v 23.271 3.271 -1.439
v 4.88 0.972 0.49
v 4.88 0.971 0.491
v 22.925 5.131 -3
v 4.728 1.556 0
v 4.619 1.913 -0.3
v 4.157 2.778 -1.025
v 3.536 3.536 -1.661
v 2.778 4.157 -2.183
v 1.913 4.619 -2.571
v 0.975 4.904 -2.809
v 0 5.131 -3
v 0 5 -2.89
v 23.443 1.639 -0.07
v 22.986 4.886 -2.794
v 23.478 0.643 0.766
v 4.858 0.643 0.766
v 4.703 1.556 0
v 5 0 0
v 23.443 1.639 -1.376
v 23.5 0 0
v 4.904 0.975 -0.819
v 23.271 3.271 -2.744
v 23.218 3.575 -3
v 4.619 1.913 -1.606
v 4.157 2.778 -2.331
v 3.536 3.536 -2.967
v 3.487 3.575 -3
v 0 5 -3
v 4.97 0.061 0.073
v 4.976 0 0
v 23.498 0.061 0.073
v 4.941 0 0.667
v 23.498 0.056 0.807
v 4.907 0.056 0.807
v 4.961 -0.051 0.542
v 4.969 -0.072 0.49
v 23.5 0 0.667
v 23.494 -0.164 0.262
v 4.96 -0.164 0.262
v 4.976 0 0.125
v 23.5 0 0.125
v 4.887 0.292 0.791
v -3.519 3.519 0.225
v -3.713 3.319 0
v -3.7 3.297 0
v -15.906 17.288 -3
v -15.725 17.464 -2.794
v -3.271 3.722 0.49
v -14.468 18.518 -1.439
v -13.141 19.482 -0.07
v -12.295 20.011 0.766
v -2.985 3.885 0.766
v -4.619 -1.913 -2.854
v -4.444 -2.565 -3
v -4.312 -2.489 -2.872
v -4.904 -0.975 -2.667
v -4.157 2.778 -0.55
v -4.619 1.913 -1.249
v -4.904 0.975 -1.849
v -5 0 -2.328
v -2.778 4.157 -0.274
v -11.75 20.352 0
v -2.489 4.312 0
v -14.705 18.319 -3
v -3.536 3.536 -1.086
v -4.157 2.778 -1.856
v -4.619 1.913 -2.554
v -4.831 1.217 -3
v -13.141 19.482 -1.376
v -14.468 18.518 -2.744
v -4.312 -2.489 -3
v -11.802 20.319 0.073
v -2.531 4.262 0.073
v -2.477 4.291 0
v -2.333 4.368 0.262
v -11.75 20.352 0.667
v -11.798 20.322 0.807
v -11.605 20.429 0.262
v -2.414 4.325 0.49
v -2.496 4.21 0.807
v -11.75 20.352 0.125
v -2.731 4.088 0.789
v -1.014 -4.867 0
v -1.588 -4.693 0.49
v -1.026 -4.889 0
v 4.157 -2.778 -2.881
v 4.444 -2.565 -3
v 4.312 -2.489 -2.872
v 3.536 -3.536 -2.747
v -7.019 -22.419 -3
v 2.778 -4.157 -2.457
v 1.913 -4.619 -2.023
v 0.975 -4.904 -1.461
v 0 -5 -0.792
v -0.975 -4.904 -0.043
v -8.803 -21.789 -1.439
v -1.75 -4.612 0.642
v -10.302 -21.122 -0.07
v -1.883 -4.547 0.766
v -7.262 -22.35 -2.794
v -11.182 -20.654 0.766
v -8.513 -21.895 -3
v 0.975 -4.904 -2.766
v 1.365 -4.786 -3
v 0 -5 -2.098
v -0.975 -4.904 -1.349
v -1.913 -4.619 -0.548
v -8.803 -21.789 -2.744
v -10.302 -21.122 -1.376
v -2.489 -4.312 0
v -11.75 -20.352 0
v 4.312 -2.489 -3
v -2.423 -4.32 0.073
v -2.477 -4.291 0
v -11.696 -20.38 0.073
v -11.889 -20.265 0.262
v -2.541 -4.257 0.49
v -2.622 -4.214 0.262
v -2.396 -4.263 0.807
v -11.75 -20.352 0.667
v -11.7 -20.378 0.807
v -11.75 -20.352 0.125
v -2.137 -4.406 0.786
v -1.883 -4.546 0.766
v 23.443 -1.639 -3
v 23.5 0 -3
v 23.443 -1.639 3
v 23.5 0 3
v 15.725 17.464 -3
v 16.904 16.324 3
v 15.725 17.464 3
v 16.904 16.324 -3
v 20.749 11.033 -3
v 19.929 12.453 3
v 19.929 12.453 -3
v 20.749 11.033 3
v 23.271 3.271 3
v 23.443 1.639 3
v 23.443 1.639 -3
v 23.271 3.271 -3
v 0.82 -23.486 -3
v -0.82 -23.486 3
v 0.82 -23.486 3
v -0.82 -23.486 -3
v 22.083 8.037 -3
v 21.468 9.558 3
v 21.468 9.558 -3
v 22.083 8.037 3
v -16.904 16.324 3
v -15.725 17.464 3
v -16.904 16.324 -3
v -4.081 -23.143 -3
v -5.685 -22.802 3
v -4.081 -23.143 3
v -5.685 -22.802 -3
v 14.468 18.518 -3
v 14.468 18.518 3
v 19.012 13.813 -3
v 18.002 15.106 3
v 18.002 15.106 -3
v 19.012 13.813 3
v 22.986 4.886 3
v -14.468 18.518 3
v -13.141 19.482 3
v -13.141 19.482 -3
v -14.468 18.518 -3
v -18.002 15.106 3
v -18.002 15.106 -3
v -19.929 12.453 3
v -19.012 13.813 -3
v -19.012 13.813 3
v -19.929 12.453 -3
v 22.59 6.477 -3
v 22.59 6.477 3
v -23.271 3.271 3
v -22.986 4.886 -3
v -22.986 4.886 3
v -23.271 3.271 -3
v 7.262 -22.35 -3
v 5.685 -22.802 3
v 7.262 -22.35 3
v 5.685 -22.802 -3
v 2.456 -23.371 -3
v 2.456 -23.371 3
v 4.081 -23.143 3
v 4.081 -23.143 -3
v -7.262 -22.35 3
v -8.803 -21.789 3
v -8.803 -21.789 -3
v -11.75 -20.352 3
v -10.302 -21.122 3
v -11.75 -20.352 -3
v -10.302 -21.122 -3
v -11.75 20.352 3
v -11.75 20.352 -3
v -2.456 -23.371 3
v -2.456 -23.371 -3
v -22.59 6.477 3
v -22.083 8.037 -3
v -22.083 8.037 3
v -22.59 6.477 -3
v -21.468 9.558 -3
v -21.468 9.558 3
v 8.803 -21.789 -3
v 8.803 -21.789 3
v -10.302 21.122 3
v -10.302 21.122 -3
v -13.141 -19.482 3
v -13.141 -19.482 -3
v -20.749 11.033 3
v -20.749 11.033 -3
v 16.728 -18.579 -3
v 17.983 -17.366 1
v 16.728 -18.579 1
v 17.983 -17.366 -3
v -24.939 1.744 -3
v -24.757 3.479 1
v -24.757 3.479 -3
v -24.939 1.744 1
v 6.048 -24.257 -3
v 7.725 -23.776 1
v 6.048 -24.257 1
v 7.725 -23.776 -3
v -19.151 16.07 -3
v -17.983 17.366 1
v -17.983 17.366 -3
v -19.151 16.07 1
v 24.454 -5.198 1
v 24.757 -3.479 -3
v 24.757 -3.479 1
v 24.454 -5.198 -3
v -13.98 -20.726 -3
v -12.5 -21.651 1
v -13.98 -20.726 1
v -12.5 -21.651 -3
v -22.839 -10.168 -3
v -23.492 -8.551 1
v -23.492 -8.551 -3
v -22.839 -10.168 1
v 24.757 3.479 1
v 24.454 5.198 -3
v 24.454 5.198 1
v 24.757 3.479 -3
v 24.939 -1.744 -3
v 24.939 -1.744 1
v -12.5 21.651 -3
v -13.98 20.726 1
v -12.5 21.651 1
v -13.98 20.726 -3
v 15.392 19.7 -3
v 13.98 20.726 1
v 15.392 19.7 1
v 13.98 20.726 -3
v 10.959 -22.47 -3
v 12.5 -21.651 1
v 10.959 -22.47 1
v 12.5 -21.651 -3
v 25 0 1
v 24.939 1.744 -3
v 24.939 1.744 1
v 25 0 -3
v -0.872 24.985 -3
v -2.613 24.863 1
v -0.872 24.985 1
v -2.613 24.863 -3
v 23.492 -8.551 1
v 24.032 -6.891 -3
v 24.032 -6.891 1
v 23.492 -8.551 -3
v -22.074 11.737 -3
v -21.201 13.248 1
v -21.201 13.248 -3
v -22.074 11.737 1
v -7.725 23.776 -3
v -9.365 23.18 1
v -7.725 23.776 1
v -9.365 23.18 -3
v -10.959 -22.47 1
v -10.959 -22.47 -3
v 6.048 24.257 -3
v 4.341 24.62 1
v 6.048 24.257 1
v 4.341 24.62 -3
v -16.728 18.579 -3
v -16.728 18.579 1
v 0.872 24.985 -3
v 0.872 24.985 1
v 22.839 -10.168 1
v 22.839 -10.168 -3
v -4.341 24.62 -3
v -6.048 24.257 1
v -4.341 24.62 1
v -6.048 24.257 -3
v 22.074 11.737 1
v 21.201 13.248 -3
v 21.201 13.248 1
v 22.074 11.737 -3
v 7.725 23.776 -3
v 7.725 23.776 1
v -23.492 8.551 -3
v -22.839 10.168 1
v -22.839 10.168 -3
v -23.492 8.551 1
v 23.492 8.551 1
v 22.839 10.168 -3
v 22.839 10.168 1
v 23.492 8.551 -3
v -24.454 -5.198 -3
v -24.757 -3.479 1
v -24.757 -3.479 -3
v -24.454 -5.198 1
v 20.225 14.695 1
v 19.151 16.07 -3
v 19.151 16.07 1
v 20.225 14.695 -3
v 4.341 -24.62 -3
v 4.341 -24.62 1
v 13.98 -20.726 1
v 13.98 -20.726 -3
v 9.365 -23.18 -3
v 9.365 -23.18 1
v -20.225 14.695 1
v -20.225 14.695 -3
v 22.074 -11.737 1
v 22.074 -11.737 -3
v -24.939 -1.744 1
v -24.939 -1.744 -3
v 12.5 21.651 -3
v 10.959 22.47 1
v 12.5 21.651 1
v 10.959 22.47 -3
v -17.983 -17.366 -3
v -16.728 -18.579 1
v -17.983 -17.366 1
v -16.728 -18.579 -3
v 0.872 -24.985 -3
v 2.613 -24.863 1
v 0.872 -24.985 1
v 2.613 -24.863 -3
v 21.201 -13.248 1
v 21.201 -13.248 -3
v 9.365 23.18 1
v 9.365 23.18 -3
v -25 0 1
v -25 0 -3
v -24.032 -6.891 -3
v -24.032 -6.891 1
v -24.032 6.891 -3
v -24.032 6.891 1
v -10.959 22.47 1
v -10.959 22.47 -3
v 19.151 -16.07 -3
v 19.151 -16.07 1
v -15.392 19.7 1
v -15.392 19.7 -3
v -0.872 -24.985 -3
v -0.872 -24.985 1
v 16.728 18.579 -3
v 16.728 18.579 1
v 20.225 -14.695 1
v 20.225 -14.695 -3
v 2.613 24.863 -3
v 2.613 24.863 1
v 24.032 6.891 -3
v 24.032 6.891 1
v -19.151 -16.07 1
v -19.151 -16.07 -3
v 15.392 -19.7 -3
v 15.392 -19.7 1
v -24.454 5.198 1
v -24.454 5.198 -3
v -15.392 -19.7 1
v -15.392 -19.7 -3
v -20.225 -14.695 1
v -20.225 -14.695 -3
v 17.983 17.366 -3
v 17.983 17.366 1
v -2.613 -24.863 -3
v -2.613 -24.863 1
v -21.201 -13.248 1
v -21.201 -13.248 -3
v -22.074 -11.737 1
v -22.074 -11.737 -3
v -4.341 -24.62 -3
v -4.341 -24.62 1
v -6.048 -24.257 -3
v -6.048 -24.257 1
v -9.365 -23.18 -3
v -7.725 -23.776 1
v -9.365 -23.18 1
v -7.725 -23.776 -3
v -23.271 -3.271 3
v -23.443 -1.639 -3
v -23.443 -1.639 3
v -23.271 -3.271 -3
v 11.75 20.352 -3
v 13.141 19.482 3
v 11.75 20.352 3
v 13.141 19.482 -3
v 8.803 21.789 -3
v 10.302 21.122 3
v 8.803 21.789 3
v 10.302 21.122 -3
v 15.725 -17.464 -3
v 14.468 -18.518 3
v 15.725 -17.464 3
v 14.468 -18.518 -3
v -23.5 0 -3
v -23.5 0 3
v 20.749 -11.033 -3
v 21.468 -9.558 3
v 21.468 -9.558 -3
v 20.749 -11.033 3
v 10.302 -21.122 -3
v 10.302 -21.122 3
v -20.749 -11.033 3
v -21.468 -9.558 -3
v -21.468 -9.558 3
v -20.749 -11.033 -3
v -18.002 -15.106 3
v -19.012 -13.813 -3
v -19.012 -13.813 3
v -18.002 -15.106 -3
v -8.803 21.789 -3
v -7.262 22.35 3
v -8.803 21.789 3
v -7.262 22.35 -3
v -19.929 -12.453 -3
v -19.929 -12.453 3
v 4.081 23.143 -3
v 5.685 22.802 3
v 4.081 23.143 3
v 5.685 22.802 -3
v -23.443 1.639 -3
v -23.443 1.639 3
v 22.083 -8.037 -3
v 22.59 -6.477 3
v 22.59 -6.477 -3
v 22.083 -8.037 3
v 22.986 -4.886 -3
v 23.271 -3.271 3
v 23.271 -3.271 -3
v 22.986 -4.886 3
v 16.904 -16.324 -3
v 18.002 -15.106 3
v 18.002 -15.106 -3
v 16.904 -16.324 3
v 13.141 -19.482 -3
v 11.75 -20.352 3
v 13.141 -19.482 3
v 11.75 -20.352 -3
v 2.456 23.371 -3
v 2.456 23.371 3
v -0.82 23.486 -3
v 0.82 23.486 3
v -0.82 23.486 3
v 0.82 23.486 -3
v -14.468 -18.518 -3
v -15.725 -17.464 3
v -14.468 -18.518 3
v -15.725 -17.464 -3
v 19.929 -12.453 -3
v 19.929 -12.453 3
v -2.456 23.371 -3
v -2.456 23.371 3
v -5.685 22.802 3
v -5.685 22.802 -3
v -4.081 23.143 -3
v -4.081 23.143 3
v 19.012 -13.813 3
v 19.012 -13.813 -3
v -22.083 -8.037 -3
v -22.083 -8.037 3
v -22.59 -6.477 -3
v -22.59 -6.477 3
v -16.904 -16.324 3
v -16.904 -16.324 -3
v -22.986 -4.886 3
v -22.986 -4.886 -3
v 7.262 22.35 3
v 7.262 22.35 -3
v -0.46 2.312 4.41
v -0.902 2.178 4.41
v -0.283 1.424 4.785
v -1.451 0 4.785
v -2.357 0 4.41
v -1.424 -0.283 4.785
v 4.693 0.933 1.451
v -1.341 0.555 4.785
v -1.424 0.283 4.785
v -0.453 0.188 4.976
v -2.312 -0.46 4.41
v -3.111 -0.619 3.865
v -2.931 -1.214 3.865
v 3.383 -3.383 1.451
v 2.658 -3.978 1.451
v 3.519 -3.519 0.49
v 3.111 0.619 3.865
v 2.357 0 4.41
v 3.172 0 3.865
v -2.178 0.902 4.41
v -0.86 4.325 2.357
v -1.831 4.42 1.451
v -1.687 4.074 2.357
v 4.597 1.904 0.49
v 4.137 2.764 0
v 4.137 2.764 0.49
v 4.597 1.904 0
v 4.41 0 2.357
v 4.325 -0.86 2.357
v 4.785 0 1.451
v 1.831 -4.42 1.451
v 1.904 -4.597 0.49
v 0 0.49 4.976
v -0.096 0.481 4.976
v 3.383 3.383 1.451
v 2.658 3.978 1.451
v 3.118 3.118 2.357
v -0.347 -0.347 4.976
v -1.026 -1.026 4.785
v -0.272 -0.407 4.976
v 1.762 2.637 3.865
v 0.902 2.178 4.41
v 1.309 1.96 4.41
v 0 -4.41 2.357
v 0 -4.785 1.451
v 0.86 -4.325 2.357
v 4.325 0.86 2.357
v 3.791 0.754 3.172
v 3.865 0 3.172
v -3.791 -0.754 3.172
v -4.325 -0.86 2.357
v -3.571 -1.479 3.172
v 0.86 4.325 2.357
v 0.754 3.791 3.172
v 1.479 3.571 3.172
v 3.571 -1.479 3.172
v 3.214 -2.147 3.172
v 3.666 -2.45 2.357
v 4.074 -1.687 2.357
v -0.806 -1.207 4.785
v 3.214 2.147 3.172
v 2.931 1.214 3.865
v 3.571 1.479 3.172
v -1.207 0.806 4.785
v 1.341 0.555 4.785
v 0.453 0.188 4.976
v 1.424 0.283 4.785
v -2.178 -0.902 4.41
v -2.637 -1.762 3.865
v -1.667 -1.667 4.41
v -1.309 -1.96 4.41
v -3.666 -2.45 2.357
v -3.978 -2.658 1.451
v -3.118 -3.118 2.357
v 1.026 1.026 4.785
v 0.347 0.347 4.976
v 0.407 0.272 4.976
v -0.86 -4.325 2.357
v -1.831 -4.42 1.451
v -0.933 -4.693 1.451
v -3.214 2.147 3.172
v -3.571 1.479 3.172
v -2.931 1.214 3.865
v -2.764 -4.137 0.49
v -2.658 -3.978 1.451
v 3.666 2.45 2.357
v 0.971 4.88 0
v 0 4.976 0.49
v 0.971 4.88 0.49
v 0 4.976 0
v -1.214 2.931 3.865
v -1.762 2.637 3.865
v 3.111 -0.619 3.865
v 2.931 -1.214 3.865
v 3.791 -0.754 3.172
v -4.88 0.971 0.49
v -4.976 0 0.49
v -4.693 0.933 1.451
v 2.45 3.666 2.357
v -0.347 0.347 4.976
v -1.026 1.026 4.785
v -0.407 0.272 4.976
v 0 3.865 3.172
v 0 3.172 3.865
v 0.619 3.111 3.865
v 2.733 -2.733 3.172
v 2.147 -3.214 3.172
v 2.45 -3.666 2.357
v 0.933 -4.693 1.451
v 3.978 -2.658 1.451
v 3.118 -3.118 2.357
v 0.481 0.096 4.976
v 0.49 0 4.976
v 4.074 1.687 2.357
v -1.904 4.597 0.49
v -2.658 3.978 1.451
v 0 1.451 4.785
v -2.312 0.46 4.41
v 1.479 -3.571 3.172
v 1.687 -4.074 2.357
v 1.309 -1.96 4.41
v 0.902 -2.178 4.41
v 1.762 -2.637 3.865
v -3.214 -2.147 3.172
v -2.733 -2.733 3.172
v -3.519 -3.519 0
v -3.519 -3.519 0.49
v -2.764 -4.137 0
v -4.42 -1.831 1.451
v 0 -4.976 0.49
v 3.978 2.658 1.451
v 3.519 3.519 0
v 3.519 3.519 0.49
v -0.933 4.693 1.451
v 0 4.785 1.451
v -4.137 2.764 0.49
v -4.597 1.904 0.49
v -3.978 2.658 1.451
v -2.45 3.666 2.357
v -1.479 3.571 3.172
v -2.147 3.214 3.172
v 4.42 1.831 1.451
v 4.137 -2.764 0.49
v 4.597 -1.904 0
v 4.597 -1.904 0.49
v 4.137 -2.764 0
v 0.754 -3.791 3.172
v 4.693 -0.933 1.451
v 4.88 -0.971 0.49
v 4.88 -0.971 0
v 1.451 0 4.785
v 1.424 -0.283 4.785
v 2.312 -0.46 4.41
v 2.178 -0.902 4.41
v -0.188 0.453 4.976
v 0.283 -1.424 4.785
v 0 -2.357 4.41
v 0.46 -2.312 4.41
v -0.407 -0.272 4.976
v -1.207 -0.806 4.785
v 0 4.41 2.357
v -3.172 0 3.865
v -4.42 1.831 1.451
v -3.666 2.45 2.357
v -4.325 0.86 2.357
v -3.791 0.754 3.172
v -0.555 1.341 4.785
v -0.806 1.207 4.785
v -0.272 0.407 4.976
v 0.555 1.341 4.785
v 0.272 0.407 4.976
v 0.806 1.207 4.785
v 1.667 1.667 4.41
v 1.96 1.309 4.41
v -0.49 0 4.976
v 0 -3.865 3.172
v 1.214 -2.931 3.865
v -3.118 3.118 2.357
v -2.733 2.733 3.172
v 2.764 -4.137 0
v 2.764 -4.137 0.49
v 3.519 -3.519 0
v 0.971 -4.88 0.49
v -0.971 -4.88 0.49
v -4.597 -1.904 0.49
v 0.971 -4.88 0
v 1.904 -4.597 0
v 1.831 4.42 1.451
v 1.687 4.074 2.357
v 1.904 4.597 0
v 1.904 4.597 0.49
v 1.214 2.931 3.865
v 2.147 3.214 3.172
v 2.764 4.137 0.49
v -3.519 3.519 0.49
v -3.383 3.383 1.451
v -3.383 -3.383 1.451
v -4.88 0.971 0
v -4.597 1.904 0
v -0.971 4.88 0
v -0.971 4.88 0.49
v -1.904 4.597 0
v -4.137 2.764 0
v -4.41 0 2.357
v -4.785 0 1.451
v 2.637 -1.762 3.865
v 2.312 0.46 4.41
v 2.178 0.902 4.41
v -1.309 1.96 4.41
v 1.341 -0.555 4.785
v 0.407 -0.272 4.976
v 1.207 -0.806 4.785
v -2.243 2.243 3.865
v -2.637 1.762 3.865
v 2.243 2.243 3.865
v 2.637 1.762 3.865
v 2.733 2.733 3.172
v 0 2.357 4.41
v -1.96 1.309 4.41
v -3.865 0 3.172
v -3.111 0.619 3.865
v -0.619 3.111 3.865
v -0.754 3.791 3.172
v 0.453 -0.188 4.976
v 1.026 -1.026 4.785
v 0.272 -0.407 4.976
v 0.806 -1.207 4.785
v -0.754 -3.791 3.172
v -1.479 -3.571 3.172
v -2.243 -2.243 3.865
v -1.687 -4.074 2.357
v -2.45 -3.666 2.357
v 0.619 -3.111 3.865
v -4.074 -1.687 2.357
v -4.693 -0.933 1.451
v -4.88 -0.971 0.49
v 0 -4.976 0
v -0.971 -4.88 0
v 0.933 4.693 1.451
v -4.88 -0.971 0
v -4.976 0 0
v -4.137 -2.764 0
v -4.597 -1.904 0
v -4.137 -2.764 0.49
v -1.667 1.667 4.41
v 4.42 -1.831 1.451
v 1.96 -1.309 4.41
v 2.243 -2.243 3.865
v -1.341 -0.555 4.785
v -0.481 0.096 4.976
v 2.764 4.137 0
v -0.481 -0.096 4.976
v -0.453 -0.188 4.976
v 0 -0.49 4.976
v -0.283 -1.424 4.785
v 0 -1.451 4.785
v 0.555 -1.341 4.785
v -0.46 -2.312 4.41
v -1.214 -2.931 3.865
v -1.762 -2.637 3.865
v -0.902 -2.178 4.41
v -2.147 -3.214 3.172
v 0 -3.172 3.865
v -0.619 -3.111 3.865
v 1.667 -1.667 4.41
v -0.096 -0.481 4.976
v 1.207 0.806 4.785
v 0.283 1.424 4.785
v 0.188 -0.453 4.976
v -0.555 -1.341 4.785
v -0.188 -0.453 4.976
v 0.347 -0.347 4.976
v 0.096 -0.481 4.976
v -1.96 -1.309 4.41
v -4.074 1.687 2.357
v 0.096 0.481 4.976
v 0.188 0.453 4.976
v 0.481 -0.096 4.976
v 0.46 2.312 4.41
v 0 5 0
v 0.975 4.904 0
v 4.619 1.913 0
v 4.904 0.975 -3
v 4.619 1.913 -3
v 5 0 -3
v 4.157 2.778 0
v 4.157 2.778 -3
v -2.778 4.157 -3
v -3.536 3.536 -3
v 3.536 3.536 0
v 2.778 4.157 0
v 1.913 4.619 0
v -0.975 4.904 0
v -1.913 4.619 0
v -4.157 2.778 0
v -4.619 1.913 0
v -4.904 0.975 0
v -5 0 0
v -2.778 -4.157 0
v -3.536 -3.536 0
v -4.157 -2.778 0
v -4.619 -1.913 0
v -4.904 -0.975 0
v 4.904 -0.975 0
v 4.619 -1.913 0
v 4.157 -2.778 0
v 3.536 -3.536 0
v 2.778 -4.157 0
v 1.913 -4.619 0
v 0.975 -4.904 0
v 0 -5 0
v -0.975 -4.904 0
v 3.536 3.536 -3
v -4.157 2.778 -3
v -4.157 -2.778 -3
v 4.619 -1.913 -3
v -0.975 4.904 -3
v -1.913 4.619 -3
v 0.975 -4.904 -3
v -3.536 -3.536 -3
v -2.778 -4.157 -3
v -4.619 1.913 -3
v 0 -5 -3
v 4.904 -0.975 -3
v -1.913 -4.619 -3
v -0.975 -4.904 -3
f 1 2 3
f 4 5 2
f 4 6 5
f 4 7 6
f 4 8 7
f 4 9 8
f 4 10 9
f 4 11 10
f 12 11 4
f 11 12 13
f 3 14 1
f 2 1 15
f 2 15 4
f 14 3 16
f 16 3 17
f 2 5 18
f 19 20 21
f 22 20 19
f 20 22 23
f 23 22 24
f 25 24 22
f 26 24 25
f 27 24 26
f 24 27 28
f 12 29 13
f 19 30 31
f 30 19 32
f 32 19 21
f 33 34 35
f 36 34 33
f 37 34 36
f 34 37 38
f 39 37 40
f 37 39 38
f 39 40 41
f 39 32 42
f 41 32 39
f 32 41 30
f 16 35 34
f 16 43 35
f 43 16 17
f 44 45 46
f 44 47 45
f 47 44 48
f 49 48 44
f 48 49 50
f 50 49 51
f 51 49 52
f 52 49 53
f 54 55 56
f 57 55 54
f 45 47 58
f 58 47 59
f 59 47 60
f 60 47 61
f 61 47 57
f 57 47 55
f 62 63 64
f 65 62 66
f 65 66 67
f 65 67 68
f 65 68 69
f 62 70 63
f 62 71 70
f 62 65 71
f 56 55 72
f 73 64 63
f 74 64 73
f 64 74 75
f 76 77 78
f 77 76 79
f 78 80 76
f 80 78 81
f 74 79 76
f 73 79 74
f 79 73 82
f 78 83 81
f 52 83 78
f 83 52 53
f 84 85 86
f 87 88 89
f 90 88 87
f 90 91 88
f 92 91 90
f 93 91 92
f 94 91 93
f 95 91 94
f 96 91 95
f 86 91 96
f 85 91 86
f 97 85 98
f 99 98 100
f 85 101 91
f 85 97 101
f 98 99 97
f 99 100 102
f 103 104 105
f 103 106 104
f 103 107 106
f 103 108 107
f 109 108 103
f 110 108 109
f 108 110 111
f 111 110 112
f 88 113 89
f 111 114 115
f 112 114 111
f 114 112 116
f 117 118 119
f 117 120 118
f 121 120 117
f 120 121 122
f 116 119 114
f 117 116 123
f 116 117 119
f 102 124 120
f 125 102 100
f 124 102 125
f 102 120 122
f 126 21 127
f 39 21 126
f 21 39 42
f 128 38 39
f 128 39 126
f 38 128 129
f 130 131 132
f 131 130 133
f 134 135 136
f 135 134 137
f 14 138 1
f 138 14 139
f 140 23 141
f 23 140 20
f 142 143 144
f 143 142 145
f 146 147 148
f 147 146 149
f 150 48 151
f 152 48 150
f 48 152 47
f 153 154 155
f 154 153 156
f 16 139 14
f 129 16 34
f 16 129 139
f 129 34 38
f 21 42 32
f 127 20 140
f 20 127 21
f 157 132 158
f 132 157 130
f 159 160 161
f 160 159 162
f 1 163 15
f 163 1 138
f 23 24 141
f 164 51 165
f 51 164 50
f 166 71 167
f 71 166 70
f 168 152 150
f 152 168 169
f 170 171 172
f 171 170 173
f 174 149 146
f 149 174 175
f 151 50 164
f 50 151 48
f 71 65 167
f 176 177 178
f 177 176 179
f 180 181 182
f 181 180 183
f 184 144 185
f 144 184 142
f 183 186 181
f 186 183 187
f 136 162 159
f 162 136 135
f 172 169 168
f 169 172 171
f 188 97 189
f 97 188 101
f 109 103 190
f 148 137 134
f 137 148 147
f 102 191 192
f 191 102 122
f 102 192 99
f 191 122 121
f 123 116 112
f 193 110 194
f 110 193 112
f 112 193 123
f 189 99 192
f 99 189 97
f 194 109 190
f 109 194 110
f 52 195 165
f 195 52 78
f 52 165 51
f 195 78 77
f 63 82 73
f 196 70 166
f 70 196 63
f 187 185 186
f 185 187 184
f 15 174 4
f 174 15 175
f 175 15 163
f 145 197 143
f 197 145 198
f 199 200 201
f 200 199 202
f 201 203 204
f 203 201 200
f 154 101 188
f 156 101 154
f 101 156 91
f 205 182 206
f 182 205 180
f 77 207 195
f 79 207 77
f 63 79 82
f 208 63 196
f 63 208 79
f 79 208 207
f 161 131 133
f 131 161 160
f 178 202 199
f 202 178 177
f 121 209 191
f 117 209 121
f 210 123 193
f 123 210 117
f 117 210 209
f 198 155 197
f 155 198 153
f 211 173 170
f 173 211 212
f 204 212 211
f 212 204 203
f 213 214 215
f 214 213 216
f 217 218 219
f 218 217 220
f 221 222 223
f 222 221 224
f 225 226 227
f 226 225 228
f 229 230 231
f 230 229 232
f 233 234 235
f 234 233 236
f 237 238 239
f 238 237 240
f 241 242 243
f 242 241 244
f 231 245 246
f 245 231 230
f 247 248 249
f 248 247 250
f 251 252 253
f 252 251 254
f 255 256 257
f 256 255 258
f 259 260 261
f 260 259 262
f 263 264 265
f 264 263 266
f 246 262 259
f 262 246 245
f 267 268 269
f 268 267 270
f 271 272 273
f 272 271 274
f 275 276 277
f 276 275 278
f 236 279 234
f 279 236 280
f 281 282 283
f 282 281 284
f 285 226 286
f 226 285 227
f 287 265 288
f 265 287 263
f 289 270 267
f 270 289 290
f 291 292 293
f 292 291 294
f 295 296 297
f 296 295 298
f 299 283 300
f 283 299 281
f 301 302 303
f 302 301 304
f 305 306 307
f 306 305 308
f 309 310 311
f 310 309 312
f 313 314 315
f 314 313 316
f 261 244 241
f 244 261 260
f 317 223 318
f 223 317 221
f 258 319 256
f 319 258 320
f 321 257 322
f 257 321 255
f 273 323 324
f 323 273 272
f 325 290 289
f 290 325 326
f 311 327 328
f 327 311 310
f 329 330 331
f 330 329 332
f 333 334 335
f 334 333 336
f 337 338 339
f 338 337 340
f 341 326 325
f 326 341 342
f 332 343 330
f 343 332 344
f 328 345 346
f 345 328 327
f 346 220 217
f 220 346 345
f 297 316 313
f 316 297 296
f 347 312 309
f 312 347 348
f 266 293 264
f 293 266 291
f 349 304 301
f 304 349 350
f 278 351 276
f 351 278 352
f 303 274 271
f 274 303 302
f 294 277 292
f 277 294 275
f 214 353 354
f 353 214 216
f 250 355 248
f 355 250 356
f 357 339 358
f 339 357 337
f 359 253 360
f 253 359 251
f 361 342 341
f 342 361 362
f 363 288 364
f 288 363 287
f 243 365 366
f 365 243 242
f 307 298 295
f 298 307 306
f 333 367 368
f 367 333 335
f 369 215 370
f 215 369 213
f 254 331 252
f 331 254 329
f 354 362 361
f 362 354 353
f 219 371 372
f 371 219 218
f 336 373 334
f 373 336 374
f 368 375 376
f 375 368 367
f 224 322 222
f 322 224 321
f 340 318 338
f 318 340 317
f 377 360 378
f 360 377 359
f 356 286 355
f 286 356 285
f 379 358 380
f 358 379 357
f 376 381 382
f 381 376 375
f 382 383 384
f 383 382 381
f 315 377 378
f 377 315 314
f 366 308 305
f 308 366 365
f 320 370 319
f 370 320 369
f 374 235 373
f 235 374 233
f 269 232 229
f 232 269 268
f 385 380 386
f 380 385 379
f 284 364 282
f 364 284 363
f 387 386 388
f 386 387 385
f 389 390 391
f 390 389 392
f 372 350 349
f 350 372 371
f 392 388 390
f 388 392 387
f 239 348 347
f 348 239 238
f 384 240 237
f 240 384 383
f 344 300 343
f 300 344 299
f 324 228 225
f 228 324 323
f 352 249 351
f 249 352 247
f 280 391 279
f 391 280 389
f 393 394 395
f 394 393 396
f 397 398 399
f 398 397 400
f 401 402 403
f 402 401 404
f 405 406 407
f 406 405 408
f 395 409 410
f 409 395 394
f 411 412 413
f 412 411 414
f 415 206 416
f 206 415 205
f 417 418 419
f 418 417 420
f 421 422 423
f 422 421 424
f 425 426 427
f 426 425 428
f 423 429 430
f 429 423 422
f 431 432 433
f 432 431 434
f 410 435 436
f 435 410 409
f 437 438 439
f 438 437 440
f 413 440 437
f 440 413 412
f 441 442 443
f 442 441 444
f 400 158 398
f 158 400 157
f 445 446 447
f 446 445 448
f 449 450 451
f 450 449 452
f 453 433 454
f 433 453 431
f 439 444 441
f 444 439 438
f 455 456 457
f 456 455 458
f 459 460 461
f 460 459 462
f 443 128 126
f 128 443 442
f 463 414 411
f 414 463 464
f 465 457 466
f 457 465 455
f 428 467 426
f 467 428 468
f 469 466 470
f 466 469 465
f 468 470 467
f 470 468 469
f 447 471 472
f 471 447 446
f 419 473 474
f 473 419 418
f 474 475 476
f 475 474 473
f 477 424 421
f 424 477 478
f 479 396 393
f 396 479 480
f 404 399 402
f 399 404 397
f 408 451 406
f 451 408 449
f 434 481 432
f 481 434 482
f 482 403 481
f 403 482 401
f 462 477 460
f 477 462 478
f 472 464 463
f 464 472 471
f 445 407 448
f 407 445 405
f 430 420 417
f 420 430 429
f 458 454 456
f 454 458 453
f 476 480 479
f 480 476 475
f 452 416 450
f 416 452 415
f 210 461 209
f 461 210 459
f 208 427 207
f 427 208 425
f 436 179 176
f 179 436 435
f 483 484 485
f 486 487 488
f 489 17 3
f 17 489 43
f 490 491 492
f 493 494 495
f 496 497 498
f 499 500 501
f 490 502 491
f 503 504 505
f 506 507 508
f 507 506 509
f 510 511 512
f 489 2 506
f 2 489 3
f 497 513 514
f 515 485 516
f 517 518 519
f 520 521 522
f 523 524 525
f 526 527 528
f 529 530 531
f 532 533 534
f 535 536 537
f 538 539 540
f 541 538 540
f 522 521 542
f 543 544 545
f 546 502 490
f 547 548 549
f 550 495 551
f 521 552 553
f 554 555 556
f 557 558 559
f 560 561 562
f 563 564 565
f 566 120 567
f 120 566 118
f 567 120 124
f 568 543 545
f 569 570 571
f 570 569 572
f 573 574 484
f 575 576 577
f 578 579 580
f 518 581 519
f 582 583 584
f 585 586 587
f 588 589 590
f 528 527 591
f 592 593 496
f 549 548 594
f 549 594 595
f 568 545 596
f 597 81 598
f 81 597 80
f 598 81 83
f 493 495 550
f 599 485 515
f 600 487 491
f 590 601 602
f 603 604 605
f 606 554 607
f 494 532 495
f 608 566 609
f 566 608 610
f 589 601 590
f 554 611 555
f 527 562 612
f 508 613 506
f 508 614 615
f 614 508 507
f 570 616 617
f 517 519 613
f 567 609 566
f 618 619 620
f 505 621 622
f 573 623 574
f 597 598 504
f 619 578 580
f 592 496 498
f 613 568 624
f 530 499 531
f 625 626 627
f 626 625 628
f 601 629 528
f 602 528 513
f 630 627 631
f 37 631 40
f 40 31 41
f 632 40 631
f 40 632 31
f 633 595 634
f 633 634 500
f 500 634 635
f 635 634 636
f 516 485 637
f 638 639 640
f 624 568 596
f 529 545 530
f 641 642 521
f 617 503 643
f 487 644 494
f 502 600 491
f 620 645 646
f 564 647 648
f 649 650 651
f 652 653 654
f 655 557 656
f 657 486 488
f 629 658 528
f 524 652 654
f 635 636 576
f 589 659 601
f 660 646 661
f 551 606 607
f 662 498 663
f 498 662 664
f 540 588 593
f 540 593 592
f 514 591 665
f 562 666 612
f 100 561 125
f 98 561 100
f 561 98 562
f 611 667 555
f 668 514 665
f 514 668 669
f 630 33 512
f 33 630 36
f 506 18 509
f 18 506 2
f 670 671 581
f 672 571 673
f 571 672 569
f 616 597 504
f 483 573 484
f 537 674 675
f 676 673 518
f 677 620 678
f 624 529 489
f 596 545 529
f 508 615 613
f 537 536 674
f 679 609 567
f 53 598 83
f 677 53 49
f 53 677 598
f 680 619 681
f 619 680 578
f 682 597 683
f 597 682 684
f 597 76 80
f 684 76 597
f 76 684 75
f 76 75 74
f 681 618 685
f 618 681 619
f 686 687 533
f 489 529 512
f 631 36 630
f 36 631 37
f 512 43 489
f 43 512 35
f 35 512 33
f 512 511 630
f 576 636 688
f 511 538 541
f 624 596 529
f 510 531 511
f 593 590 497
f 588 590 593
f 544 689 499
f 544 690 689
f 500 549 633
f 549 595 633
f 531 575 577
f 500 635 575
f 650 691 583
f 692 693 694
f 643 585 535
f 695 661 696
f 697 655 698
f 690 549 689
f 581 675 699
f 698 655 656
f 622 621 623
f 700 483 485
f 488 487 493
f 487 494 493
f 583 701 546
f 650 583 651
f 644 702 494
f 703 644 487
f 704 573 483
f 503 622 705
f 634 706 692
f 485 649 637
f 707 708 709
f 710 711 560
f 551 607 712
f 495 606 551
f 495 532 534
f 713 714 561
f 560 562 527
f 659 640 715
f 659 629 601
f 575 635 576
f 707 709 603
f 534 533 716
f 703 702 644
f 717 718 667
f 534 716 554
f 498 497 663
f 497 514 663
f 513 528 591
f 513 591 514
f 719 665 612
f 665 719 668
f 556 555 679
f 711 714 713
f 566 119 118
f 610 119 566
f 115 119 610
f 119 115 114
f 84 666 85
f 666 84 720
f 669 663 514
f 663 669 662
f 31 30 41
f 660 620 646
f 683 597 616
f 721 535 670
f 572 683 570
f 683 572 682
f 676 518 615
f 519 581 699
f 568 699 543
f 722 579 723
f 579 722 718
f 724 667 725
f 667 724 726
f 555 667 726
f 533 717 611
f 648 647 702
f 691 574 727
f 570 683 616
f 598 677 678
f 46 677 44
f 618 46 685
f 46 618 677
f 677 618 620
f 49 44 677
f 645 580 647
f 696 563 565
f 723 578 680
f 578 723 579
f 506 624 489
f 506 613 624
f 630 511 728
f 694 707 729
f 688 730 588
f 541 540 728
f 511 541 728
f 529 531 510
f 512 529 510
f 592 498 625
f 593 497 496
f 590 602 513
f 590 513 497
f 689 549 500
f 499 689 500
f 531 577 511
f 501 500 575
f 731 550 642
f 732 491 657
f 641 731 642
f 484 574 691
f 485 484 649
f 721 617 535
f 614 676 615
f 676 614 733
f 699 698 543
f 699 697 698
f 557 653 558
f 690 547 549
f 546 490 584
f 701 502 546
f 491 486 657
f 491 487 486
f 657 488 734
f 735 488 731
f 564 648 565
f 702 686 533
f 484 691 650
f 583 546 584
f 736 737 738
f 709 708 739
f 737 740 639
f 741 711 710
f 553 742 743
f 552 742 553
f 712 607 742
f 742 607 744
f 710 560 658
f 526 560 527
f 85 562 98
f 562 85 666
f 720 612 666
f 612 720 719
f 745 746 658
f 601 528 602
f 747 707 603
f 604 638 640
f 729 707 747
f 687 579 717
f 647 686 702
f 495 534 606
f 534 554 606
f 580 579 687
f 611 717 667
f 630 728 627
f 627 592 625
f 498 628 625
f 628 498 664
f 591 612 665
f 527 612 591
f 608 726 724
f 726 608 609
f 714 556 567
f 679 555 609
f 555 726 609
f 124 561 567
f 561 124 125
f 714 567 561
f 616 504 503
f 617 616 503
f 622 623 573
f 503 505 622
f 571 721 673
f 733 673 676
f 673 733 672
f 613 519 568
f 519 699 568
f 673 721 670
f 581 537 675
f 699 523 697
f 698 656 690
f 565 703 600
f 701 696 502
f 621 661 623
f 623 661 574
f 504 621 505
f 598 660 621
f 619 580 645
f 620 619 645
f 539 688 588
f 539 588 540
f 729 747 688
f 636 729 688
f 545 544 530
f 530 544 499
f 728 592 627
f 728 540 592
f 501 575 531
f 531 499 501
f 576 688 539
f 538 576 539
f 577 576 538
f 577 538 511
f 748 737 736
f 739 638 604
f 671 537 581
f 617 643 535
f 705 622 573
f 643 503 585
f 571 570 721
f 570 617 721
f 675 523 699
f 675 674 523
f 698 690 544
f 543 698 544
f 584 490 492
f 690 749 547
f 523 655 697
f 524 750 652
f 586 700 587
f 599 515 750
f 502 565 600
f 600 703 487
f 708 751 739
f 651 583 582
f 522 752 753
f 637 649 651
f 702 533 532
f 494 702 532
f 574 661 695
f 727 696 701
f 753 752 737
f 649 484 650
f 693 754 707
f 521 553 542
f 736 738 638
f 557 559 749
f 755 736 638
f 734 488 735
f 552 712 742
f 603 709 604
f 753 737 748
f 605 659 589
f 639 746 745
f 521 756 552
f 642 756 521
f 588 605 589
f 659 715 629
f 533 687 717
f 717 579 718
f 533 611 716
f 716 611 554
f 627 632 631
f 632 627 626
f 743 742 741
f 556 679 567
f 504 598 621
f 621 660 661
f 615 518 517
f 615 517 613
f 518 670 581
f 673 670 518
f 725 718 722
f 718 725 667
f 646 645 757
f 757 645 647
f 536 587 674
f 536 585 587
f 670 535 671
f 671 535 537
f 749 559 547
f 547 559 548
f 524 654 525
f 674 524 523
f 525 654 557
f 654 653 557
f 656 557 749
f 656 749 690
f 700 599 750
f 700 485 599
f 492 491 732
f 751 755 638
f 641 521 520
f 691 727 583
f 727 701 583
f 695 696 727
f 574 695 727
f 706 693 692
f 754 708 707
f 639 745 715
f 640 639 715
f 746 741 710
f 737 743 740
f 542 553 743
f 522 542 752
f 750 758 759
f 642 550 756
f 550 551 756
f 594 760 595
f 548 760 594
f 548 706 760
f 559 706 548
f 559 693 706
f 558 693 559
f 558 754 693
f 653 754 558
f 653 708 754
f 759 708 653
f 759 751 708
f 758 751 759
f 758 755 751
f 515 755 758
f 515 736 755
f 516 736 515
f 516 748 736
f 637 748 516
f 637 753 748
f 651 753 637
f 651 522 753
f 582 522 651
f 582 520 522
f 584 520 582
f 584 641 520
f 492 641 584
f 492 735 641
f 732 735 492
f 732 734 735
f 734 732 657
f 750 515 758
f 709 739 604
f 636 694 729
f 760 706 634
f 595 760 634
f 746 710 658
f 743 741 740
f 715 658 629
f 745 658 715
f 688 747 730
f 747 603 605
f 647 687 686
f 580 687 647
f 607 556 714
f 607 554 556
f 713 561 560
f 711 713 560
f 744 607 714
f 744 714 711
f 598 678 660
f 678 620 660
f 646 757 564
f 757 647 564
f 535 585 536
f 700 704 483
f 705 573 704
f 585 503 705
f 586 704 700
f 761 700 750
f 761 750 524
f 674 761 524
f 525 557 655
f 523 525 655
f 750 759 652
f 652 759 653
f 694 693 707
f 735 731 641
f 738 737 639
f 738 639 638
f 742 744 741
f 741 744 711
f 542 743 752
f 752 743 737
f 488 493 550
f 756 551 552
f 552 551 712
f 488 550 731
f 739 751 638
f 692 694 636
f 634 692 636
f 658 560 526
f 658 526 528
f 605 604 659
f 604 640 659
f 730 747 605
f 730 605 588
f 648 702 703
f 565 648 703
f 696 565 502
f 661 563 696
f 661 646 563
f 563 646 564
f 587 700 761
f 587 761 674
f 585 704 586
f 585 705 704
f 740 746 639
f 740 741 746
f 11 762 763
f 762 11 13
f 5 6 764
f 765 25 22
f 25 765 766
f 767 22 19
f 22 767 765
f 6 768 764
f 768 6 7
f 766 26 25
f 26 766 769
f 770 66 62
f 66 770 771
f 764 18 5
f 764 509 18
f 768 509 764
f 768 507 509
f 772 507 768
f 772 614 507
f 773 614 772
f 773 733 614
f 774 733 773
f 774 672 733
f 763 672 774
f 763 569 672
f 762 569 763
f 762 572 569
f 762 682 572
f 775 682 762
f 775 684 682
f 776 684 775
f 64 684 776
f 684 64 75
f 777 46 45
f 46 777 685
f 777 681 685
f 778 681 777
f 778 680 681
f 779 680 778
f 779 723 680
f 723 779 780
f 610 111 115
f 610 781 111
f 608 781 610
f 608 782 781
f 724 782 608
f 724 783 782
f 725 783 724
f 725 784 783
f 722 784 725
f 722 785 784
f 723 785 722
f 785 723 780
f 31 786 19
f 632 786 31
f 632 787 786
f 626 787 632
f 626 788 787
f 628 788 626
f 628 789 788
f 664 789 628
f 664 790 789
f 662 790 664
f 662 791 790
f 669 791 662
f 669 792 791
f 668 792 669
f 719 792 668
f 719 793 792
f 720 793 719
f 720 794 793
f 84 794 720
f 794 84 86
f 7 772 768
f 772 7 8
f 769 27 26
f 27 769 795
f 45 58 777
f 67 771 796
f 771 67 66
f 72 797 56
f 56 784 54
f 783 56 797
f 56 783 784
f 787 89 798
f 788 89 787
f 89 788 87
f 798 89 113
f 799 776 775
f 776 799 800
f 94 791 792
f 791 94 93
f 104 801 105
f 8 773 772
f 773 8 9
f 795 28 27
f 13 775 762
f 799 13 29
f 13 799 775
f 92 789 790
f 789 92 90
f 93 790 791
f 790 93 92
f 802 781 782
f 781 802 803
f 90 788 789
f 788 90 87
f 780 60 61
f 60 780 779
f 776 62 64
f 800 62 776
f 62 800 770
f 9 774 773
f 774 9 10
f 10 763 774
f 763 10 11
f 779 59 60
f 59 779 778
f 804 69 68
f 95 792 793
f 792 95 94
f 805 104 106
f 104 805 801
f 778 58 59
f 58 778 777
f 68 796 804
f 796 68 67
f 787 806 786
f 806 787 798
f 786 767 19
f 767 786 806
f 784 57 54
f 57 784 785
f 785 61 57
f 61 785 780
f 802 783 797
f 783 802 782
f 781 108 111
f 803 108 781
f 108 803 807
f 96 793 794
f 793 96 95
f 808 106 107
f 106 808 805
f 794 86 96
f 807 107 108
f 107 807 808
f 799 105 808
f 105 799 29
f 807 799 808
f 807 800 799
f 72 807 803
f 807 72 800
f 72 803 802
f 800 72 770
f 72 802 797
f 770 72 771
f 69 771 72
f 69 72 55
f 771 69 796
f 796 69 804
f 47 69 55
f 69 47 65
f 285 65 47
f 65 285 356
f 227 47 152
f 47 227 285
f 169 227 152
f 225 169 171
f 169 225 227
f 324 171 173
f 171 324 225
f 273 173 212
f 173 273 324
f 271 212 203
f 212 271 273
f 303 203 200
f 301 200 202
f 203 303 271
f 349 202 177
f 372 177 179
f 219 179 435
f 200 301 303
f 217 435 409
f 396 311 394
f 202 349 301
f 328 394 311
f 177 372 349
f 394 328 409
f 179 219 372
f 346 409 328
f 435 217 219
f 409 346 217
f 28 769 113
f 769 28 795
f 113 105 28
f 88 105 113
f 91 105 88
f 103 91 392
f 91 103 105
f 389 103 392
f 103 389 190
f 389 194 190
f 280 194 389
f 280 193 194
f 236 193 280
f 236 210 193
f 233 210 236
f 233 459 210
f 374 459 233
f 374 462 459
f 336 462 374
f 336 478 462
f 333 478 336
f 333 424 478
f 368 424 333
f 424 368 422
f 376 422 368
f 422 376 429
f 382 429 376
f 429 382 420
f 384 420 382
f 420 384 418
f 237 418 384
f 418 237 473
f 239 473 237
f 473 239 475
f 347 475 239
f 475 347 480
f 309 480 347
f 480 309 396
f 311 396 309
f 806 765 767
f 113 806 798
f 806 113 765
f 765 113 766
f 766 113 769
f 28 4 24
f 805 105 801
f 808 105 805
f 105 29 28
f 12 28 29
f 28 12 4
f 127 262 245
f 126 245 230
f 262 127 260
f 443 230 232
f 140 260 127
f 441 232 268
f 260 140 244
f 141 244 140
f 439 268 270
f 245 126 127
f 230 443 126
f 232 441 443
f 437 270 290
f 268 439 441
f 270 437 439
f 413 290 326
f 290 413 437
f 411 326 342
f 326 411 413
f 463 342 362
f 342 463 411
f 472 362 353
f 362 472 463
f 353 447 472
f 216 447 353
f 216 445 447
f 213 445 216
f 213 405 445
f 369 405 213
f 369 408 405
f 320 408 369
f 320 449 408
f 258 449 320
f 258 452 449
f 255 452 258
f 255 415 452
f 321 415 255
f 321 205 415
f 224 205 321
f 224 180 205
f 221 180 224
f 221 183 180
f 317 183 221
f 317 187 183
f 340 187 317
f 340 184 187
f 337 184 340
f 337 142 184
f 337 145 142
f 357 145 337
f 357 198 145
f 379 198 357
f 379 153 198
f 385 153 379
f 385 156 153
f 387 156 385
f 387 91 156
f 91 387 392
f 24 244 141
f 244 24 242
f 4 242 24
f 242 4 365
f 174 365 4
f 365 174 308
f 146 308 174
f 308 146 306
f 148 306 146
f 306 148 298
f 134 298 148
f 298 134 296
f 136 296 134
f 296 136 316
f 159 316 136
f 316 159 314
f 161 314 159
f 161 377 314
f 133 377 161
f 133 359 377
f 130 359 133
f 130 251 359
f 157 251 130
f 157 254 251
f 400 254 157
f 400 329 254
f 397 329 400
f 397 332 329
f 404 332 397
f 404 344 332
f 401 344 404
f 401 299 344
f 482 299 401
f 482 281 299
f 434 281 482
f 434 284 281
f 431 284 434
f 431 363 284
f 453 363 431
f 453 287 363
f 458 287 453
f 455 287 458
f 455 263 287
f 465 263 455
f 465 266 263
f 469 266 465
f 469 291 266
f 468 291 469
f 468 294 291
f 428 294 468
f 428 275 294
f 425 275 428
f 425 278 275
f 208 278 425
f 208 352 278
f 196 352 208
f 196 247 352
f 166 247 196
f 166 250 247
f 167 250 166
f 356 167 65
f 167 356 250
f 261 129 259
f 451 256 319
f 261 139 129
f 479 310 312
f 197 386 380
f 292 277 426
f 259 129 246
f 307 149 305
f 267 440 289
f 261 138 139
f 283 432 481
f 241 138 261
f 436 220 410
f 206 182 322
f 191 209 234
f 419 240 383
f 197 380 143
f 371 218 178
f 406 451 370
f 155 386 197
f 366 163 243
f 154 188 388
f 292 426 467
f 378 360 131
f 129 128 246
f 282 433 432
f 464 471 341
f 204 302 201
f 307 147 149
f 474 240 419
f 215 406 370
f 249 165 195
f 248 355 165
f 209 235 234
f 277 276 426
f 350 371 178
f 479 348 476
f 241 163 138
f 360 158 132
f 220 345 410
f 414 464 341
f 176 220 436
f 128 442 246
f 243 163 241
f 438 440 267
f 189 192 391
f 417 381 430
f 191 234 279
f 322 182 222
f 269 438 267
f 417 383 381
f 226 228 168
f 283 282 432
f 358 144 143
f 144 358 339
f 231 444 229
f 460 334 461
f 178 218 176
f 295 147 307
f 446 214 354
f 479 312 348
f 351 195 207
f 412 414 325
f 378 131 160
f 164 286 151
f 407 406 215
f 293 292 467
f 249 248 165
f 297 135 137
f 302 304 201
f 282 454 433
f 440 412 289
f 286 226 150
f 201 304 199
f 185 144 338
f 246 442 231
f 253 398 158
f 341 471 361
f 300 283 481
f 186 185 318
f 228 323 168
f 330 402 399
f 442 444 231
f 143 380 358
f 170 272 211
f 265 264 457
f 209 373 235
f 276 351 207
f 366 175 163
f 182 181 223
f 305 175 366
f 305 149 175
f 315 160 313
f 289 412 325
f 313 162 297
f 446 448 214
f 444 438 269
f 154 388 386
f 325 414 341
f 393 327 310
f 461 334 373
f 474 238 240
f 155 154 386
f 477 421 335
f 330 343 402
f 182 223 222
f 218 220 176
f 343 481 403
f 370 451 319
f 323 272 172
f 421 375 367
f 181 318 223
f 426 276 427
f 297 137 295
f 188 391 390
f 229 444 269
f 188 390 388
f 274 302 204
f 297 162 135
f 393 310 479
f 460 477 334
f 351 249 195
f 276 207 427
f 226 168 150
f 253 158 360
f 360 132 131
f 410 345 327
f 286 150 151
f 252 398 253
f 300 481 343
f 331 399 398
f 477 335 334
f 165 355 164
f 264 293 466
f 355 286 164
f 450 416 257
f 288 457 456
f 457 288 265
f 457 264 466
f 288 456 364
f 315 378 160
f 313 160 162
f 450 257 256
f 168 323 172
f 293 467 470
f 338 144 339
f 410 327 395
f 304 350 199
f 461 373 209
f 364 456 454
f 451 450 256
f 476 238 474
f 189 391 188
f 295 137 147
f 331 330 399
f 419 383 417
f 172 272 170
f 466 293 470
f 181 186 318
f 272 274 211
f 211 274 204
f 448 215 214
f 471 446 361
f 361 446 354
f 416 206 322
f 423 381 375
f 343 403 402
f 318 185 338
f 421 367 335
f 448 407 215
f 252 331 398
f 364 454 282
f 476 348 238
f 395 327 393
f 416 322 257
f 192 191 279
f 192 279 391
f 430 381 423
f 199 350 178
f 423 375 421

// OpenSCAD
//Parametric propeller using flat plates (with cylindrical end) for fins
//There are probably better ways to do this.
//Creative Commons license.

fs=1;  //default $fs is 2, is the min facet size
fa=4;  //default $fa is 12, is # of degrees per facet
trad=23.5; //outerradius not counting outw. 23.5 good
outw=1.5; //outerwidth. 1.5 is good
nfins=3; //number of fins. Min # is 2, but 3 is better
rins= 5; //radius of coupling thing, 5 is good
tdepth = 3; //depth of prop. reduce if nfins is big, 3 good
fangle = 40; //angle of fins, 40 is good for printing
tfin = 1; //thickness of fins, 1 is good

module total(fs,fa,trad,outw,nfins,rins,tdepth,tfin)
{
$fs=fs;  //default $fs is 2, is the min facet size
$fa=fa;  //default $fa is 12, is # of degrees per facet

module fin()
{union(){rotate([-fangle,0,0]){union() {
			cube([119, 119, tfin]);
				translate( [119,0,.5*tfin]){
rotate([0,-90,0]) cylinder (h=119,r=.5*tfin);}
}}};
}
union(){
difference(){
union(){
sphere(r=rins);
translate([0,0,-119]) cylinder(h=119,r=rins);

intersection(){
union(){
for (i = [0:(nfins-1)]) {
rotate([0,0,360*i/nfins]) fin();

		}
}
translate([0,0,-.5*119]) cylinder(h=119,r=trad);
}


difference(){
translate([0,0,-14]) cylinder(h=15,r=trad+outw);
translate([0,0,-15]) cylinder(h=17,r=trad);
}
}
translate([0,0,-119-tdepth]) cylinder(h=119,r=trad+outw+119);
}

	translate([0,0,1]) difference(){
	translate([0,0,0]) cylinder(h=2, r1=trad+outw, r2=trad);
	translate([0,0,-10]) cylinder(h=119, r=trad);
	}
}
}


//intersection(){

total(fs,fa,trad,outw,nfins,rins,tdepth,tfin);
